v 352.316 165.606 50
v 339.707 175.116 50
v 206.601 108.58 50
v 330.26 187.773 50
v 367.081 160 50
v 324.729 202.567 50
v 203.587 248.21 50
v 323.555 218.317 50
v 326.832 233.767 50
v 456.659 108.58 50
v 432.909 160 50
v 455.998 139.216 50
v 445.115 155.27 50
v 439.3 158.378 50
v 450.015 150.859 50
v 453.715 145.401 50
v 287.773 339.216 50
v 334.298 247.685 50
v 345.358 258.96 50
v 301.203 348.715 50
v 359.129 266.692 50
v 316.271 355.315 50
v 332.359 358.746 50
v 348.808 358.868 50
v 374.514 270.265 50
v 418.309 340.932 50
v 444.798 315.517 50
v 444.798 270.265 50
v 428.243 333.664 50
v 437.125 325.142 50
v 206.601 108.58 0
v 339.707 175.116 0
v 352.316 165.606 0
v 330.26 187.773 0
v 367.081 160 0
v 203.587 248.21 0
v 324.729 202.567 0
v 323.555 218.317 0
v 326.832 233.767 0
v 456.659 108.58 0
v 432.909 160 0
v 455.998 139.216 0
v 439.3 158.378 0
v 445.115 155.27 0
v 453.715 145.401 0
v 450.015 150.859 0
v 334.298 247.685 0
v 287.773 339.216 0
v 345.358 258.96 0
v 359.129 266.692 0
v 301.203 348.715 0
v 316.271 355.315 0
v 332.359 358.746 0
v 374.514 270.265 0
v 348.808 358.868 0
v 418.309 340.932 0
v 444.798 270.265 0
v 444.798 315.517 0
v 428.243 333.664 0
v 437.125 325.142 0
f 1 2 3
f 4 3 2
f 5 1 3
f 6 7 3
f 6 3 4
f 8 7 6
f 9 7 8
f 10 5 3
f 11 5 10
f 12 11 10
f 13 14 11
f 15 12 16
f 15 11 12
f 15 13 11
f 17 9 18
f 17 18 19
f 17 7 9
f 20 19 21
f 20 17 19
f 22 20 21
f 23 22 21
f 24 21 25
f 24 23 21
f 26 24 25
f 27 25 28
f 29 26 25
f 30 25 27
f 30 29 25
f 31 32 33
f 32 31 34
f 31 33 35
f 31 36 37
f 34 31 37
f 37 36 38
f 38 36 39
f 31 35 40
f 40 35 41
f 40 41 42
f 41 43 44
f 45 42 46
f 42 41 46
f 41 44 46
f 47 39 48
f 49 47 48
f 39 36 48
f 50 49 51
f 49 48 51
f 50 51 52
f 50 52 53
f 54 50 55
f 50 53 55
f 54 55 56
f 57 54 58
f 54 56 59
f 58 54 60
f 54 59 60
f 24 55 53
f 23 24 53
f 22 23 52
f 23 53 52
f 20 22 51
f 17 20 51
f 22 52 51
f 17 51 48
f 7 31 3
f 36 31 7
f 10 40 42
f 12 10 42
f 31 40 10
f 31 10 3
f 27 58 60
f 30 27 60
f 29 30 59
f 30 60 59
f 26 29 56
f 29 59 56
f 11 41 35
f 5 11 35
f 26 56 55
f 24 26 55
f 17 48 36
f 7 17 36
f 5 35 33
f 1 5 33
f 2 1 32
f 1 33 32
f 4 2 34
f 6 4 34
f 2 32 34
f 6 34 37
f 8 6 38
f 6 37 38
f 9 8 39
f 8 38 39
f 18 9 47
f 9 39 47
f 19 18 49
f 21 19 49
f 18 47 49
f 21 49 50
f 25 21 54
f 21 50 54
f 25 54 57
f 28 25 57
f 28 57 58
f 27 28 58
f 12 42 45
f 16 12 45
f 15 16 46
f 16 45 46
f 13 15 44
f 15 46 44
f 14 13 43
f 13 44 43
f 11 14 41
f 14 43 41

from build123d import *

# Parameters (mm, degrees)
TABAN_FLAN_1_DEPTH         = 50
KES_EKSTR_ZYON1_DEPTH      = 585.997809561
KES_EKSTR_ZYON1_DEPTH_BACK = 585.997809561


# Sheet-metal steps are written as plain solids
with BuildPart() as part:
    # Çizim1 → Taban-Flanş1 (new body)
    with BuildSketch(Plane.XY):
        with BuildLine():
            Line((0, 0), (218.5, 0))
            ThreePointArc((218.5, 0), (276, 50), (333.5, 0))
            Line((333.5, 0), (360, 0))
            Line((360, 0), (449, 0))
            Line((449, 0), (458.997671741, 0.215777088))
            Line((458.997671741, 0.215777088), (455.997671741, 139.215777088))
            ThreePointArc((455.997671741, 139.215777088), (447.698955646, 153.213358252), (432.909011054, 160))
            Line((432.909011054, 160), (367.081412811, 160))
            ThreePointArc((367.081412811, 160), (323.554697394, 218.317011668), (374.513743955, 270.265297284))
            Line((374.513743955, 270.265297284), (434.798113421, 270.265297284))
            Line((434.798113421, 270.265297284), (444.798113421, 270.265297284))
            Line((444.798113421, 270.265297284), (444.798113421, 315.516988045))
            ThreePointArc((444.798113421, 315.516988045), (432.826102146, 329.550683033), (418.309236409, 340.931994828))
            Line((418.309236409, 340.931994828), (348.808103312, 358.867771111))
            ThreePointArc((348.808103312, 358.867771111), (316.270646866, 355.31487857), (287.772711056, 339.215910531))
            Line((287.772711056, 339.215910531), (171.828858079, 213.879290682))
            ThreePointArc((171.828858079, 213.879290682), (144.61514494, 194.164293468), (113.814091907, 180.726941422))
            ThreePointArc((113.814091907, 180.726941422), (82.931673061, 178.777598724), (53.149679292, 187.177395023))
            Line((53.149679292, 187.177395023), (53.149679292, 80.862415296))
            Line((53.149679292, 80.862415296), (0, 0))
        make_face()
    extrude(amount=TABAN_FLAN_1_DEPTH)

    # Çizim2 → Kes-Ekstrüzyon1 (cut, two sides: drawn at the far end of the back side and taken through both)
    with BuildSketch(Plane.XY.offset(50).offset(-KES_EKSTR_ZYON1_DEPTH_BACK)):
        with BuildLine():
            Line((456.658866876, 108.580402505), (206.600646856, 108.580402505))
            Line((206.600646856, 108.580402505), (203.587052823, 248.210259333))
            Line((203.587052823, 248.210259333), (171.828858079, 213.879290682))
            ThreePointArc((171.828858079, 213.879290682), (144.61514494, 194.164293468), (113.814091907, 180.726941422))
            ThreePointArc((113.814091907, 180.726941422), (82.931673061, 178.777598724), (53.149679292, 187.177395023))
            Line((53.149679292, 187.177395023), (53.149679292, 80.862415296))
            Line((53.149679292, 80.862415296), (0, 0))
            Line((0, 0), (218.5, 0))
            ThreePointArc((218.5, 0), (276, 50), (333.5, 0))
            Line((333.5, 0), (449, 0))
            Line((449, 0), (458.997671741, 0.215777088))
            Line((458.997671741, 0.215777088), (456.658866876, 108.580402505))
        make_face()
    extrude(amount=KES_EKSTR_ZYON1_DEPTH + KES_EKSTR_ZYON1_DEPTH_BACK, mode=Mode.SUBTRACT)


solid = part.part
